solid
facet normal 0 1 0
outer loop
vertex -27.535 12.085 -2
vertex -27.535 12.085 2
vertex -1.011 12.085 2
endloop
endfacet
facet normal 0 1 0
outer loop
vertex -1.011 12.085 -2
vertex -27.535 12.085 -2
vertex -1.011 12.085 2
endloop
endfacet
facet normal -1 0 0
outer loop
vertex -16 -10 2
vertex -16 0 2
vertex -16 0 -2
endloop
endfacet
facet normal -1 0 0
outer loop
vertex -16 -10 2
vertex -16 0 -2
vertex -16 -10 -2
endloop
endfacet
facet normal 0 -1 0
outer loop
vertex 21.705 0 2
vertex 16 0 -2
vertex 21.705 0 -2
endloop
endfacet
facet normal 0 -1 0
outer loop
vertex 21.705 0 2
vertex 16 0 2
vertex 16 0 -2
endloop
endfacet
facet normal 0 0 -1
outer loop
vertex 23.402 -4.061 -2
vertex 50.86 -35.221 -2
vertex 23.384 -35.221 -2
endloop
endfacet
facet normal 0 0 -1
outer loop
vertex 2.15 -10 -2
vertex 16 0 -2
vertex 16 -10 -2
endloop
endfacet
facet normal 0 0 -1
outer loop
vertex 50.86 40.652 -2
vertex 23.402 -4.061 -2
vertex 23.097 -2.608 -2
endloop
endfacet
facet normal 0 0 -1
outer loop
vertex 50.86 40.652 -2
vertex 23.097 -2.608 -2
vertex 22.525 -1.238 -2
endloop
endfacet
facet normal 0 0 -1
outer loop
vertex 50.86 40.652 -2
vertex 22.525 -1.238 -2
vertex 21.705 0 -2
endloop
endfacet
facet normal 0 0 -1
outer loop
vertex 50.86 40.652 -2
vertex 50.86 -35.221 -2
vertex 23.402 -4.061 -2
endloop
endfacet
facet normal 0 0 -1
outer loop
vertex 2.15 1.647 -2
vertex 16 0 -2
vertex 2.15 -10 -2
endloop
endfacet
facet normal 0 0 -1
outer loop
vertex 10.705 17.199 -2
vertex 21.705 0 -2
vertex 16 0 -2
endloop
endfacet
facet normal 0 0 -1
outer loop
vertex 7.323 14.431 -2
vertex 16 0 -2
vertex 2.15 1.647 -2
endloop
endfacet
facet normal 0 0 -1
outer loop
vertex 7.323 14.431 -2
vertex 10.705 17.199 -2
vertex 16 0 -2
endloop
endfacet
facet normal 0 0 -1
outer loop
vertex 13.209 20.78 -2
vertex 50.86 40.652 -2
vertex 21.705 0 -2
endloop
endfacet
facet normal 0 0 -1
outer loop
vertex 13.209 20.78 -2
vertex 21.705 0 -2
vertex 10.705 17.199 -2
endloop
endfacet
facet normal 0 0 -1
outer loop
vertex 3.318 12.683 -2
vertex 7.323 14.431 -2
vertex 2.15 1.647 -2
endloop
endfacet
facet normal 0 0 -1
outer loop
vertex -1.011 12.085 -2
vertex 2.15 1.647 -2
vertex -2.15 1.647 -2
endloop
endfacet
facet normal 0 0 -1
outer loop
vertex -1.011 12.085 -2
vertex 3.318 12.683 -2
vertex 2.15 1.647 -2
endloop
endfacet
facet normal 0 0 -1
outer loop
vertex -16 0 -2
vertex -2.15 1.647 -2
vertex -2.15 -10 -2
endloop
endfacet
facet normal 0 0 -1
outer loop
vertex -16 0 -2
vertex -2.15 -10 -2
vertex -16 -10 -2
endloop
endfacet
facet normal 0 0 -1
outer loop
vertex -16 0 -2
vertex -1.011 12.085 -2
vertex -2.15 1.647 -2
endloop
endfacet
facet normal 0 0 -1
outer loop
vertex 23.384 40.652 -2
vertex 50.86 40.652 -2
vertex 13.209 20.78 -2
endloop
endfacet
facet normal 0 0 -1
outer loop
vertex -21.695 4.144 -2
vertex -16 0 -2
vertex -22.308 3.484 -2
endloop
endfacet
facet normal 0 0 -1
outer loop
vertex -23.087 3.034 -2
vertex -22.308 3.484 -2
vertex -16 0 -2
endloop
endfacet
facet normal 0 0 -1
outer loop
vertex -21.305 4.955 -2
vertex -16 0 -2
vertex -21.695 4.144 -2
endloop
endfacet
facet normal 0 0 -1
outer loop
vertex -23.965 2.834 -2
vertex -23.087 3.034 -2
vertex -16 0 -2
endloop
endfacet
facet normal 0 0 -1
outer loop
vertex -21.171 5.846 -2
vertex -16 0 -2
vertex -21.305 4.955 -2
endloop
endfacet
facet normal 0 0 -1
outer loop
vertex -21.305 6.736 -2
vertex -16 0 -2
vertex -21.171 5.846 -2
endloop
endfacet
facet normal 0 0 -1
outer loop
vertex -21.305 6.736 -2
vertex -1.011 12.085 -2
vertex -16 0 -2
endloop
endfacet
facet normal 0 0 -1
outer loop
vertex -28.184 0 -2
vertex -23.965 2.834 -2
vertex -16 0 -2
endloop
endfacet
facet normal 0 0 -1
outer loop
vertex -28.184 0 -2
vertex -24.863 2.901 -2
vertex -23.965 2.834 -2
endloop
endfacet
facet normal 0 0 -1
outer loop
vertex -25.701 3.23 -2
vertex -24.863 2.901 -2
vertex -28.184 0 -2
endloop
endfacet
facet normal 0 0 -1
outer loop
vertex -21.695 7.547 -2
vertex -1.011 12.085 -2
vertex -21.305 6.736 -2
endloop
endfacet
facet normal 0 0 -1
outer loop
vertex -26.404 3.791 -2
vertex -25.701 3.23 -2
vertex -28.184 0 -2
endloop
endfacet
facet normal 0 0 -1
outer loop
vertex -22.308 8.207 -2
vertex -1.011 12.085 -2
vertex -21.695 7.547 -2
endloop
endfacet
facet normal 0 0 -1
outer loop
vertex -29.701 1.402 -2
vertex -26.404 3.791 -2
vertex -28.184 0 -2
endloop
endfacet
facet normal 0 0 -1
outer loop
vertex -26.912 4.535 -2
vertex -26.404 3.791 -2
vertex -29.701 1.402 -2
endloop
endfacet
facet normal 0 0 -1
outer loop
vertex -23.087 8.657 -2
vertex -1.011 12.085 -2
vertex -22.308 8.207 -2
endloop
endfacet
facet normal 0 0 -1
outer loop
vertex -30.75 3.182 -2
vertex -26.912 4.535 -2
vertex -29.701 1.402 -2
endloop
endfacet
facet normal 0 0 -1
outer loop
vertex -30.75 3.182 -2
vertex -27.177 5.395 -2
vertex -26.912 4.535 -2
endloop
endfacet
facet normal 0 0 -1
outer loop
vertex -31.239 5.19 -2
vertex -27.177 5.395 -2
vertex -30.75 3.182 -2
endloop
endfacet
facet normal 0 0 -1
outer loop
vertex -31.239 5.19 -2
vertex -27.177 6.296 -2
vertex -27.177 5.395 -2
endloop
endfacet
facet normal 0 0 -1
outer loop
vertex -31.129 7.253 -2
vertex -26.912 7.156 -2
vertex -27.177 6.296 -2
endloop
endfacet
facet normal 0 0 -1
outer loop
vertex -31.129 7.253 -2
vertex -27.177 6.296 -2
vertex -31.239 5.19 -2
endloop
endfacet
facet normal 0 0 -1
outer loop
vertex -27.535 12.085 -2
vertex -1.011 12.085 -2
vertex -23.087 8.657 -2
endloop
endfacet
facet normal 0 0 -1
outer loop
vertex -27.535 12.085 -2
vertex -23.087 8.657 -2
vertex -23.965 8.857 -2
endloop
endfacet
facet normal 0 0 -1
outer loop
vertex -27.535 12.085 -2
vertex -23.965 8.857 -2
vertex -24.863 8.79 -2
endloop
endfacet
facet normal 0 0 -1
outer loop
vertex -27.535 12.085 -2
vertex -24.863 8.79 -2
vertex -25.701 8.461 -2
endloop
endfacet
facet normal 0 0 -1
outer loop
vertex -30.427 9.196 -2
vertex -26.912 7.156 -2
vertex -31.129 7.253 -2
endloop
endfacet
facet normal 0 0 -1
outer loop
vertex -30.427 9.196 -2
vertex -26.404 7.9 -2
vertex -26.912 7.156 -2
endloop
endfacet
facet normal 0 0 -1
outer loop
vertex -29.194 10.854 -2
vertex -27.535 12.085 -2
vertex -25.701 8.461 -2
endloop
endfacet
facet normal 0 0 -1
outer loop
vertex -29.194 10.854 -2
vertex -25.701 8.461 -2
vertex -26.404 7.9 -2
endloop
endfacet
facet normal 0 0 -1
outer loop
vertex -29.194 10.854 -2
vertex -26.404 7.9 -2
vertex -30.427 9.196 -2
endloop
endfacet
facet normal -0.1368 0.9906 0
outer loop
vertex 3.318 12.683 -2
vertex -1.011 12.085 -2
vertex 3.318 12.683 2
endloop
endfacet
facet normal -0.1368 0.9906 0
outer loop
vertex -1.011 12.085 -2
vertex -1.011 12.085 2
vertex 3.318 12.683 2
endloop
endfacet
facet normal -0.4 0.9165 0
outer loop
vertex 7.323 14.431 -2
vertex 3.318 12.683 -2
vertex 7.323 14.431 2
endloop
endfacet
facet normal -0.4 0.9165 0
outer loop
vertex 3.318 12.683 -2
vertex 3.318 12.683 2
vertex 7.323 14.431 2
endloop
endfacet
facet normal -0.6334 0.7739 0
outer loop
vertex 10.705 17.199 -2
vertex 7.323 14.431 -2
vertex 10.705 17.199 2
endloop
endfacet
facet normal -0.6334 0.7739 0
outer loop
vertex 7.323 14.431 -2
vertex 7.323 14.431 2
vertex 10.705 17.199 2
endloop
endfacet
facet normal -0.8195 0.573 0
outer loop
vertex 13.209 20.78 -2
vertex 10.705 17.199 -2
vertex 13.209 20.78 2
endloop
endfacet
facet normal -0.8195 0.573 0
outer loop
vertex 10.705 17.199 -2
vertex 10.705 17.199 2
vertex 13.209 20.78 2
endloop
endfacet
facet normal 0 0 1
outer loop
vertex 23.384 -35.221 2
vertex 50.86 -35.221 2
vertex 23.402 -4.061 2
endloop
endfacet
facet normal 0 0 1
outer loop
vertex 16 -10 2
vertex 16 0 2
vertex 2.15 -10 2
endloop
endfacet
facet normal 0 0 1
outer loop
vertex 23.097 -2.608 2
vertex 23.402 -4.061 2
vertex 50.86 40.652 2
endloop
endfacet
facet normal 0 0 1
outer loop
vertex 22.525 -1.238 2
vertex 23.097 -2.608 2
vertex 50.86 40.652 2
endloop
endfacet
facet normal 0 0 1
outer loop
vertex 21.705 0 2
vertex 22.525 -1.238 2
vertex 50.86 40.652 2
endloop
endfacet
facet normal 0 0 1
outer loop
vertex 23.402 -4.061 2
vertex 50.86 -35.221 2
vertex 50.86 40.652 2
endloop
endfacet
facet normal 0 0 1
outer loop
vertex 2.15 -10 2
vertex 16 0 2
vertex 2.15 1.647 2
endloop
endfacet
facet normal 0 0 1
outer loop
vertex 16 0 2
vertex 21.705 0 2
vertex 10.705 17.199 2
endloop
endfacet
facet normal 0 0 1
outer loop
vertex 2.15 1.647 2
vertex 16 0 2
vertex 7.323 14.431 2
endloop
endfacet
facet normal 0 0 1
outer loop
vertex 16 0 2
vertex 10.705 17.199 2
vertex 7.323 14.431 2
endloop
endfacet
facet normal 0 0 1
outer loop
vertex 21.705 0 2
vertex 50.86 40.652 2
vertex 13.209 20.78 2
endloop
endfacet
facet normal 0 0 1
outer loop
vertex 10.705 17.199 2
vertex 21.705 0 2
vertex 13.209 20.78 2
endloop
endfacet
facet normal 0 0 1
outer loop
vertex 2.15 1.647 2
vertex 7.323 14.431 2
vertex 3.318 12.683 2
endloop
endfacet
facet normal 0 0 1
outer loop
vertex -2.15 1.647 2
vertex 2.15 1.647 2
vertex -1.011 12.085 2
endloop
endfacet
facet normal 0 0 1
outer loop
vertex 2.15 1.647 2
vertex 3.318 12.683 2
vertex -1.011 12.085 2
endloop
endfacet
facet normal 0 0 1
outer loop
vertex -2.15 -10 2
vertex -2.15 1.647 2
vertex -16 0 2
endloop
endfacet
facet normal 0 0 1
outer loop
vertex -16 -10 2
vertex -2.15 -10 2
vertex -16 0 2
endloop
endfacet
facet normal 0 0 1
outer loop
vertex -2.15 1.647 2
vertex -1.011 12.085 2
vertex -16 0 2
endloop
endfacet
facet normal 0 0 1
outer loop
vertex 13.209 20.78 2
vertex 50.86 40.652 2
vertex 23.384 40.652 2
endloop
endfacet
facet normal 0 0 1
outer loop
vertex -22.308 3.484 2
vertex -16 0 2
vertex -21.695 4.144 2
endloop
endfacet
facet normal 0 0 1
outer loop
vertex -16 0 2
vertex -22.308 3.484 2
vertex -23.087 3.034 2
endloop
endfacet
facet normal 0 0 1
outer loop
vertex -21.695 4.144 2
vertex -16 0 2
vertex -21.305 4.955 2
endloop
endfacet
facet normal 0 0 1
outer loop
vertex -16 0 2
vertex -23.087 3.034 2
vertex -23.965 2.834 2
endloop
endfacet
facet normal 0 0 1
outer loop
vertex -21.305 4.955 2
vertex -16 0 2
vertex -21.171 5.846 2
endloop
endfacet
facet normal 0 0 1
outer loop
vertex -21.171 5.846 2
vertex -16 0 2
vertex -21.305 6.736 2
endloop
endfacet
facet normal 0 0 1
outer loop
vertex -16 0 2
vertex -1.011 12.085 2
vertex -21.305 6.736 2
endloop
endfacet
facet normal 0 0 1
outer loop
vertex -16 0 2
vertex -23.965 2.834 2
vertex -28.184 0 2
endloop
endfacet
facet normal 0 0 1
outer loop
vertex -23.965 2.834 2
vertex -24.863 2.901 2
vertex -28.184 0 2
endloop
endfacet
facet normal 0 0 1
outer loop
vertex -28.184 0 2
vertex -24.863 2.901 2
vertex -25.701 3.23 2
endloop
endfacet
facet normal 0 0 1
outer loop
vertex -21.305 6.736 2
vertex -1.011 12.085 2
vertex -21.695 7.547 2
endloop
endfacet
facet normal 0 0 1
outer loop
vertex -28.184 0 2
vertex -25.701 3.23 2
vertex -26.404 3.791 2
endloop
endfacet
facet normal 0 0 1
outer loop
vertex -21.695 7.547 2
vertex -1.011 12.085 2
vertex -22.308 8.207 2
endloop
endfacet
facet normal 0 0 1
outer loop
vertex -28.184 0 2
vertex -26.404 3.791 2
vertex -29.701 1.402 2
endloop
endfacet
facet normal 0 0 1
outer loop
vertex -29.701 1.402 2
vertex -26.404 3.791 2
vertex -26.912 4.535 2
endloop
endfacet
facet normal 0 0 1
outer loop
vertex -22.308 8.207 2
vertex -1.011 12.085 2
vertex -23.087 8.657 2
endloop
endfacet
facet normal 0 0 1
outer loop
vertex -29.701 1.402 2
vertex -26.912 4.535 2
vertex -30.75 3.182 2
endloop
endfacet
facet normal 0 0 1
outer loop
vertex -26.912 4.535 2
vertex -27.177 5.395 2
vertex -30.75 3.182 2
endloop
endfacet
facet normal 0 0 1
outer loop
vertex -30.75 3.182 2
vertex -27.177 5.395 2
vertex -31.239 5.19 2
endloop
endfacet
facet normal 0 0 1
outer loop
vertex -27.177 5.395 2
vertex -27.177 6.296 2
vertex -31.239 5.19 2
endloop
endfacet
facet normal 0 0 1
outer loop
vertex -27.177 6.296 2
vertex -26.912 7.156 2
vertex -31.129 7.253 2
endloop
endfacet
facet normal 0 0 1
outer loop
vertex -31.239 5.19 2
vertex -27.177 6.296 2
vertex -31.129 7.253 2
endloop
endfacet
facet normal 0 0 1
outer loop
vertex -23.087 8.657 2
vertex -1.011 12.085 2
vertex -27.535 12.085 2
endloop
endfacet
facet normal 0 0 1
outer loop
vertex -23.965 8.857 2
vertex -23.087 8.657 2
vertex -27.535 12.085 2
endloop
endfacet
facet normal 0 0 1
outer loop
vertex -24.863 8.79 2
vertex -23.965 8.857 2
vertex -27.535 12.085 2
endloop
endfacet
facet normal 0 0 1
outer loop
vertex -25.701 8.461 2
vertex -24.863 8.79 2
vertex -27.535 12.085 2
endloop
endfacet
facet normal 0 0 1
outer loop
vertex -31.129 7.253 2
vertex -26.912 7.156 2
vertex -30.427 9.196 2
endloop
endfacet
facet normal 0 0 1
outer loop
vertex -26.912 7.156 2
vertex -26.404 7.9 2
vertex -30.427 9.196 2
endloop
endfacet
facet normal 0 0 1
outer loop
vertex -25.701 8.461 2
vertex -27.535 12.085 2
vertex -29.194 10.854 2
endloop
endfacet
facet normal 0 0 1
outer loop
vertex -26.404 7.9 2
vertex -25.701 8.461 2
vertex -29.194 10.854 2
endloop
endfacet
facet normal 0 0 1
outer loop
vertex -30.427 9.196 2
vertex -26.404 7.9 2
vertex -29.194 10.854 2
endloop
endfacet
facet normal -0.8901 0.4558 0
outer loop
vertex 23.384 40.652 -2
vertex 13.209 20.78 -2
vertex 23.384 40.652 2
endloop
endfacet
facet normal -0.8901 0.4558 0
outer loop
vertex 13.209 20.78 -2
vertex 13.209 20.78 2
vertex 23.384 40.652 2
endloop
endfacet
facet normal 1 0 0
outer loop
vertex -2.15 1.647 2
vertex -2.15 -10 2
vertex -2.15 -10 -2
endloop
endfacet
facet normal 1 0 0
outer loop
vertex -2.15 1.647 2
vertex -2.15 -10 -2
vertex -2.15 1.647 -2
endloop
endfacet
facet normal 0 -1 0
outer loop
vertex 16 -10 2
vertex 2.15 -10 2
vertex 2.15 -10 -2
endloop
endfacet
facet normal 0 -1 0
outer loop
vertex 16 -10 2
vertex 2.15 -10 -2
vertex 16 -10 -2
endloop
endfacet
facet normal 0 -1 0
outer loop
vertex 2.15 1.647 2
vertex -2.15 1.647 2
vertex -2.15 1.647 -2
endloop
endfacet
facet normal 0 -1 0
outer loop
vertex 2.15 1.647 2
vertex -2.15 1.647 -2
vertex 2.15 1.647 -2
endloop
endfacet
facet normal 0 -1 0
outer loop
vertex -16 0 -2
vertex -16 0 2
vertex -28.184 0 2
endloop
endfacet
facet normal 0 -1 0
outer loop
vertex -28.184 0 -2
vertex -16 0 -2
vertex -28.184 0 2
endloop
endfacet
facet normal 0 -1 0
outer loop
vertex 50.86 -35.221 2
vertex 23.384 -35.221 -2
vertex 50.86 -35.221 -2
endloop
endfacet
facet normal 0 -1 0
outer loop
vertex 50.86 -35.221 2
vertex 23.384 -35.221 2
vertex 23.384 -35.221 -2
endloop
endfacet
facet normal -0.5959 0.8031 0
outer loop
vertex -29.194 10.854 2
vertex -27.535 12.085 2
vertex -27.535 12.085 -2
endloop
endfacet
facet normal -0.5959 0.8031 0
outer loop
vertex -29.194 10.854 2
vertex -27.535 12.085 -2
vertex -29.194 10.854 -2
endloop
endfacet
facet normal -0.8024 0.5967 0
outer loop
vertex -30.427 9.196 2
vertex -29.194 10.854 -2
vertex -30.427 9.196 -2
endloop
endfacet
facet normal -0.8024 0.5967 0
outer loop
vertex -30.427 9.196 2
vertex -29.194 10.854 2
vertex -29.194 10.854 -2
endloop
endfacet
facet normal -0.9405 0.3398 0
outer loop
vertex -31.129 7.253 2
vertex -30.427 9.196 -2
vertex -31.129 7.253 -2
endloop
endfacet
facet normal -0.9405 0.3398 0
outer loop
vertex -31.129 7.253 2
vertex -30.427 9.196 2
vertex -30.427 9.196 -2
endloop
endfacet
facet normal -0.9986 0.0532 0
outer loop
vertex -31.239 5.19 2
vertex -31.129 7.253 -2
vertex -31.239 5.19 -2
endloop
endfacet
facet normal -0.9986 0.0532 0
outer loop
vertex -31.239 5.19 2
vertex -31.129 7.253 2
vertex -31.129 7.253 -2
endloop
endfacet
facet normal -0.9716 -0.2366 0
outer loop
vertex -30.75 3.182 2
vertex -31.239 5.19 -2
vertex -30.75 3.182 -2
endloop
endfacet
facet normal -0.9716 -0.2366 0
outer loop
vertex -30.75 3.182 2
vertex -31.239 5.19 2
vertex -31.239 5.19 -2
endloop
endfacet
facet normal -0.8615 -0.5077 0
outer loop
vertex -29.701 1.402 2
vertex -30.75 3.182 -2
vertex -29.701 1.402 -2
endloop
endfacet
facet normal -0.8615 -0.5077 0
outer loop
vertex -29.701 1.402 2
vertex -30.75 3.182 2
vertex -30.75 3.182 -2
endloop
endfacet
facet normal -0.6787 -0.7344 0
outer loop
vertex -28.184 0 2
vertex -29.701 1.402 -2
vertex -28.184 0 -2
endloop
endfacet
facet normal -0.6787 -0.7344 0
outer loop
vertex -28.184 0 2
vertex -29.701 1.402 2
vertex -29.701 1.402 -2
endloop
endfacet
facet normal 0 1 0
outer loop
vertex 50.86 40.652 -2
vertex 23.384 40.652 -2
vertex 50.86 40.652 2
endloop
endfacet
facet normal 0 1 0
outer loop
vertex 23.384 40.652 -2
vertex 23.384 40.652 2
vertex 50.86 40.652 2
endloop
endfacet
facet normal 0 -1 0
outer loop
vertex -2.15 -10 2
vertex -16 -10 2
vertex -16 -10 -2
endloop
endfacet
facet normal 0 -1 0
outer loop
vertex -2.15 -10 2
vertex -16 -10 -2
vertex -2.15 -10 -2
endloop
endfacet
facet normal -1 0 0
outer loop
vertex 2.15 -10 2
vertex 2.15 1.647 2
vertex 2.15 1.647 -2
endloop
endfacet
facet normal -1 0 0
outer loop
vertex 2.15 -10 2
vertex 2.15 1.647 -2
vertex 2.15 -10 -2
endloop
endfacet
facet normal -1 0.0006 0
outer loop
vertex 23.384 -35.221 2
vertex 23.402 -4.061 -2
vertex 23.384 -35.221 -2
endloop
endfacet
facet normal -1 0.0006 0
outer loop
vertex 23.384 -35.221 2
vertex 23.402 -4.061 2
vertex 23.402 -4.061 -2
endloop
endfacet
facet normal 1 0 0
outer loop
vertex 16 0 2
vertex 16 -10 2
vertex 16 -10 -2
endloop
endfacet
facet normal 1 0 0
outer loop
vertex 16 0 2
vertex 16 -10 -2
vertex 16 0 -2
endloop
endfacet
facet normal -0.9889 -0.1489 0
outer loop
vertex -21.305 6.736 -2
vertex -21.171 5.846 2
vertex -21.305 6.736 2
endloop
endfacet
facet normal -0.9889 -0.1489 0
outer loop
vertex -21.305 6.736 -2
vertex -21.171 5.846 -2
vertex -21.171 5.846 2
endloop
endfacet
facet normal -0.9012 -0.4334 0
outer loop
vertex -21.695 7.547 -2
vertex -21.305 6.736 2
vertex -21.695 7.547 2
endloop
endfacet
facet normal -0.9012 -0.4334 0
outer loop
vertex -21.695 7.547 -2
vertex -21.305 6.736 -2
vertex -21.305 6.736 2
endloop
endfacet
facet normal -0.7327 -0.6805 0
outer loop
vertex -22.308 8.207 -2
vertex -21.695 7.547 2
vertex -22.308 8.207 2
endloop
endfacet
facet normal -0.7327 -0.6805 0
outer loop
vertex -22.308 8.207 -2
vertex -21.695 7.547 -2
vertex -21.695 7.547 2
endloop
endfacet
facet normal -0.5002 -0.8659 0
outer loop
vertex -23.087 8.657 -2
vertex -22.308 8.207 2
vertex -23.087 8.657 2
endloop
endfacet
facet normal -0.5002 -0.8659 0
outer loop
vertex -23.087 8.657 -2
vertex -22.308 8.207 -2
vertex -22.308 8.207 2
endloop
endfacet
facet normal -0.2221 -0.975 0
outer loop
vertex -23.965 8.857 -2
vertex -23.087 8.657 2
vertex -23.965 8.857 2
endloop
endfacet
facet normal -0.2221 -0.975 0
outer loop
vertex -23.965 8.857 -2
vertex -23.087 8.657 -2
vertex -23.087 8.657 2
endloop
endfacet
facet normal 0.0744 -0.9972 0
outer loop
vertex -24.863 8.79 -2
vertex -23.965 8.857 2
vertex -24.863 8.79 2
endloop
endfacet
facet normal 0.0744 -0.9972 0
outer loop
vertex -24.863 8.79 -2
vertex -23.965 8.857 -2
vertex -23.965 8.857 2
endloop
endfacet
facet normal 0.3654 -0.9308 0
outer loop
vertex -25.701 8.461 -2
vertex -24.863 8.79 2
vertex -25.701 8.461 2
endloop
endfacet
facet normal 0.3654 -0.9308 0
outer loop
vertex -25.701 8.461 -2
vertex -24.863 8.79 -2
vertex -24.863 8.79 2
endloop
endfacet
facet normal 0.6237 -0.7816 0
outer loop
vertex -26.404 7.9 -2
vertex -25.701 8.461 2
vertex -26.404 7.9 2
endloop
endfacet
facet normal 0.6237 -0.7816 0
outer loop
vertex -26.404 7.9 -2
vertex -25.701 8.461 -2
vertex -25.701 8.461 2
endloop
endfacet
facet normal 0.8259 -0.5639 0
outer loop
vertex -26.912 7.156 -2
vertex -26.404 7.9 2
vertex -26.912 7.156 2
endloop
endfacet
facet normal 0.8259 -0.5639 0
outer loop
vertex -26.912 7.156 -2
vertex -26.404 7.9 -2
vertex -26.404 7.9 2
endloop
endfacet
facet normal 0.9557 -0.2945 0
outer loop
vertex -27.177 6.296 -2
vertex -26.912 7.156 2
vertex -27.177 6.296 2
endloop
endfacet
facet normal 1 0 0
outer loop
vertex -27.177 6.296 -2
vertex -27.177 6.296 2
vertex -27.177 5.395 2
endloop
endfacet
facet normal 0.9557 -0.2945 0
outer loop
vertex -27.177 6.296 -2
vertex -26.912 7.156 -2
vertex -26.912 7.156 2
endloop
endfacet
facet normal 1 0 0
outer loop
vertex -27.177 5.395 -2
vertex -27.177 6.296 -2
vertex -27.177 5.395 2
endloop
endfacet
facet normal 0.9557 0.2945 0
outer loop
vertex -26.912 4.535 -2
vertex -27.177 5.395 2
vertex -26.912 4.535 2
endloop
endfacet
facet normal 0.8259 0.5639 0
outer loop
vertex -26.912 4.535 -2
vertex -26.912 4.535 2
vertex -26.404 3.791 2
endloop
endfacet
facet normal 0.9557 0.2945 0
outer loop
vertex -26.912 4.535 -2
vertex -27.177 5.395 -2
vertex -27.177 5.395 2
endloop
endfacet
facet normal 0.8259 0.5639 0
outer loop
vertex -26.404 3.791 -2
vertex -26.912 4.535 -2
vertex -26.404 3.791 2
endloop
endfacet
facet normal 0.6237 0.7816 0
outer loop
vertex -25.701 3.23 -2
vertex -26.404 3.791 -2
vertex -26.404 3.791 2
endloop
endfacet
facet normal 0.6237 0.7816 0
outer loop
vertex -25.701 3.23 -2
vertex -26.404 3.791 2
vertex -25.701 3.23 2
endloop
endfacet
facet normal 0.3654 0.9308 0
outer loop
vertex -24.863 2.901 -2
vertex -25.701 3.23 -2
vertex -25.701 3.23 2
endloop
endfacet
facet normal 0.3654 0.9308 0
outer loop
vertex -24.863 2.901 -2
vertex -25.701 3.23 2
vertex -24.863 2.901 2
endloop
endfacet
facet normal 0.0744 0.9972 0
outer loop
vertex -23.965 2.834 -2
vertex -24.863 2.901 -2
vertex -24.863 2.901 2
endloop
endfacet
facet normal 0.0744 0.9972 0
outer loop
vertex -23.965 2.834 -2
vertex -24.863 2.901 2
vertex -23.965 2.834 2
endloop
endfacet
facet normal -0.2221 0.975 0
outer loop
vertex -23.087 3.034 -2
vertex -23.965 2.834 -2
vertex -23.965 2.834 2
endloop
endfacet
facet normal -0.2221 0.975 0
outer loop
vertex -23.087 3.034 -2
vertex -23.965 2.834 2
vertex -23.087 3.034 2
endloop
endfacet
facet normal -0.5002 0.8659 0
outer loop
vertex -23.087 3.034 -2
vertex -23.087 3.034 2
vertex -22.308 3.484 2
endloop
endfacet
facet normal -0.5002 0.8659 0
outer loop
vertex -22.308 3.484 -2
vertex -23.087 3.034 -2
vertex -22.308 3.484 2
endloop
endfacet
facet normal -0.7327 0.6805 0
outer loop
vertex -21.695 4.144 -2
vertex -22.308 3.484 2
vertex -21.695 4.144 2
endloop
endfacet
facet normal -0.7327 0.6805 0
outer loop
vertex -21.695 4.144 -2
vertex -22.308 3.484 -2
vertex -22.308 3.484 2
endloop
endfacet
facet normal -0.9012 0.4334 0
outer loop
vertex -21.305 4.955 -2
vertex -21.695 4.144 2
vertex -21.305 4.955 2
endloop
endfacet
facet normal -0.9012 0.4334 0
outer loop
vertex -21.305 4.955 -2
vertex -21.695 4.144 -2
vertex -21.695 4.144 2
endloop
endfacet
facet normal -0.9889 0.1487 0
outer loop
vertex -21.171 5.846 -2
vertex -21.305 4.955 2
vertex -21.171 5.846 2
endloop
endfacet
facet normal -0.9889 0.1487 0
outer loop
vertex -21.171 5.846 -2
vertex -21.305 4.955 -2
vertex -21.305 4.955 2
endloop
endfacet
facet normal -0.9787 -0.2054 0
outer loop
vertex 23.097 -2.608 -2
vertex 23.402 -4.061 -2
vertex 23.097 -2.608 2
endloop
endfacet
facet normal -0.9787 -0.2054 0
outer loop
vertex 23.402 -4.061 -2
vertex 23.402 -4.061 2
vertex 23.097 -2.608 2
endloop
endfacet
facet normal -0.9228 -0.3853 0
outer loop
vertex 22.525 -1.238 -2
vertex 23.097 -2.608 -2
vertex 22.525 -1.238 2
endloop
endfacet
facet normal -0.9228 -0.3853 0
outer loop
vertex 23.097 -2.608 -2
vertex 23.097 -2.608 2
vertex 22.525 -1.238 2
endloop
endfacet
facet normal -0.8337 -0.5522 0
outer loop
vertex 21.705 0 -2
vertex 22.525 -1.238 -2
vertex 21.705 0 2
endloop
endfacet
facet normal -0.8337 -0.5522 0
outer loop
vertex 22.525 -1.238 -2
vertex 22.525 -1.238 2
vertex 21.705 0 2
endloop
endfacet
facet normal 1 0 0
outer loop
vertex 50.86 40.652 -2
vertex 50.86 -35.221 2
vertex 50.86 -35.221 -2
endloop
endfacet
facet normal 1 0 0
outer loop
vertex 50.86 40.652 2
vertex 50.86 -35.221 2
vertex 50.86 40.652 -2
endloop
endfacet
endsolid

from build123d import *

# Parameters (mm, degrees)
COPYSKETCH004_R = 3.02
PAD_DEPTH       = 2


with BuildPart() as part:
    # CopySketch004 → Pad (new body, symmetric)
    with BuildSketch(Plane.XY):
        with BuildLine():
            Line((-27.534542, 12.08528), (-1.01073, 12.08528))
            ThreePointArc((-1.01073, 12.08528), (7.323138, 14.431249), (13.209413, 20.780161))
            Line((13.209413, 20.780161), (23.383837, 40.65183))
            Line((23.383837, 40.65183), (50.86044, 40.65183))
            Line((50.86044, 40.65183), (50.86044, 0))
            Line((50.86044, -35.221027), (50.86044, 0))
            Line((23.383837, -35.221027), (50.86044, -35.221027))
            Line((23.401691, -4.060687), (23.383837, -35.221027))
            ThreePointArc((23.401691, -4.060687), (22.843077, -1.909417), (21.705474, 0))
            Line((16, 0), (21.705474, 0))
            Line((16, -10), (16, 0))
            Line((2.15, -10), (16, -10))
            Line((2.15, 1.647389), (2.15, -10))
            Line((-2.15, 1.647389), (2.15, 1.647389))
            Line((-2.15, -10), (-2.15, 1.647389))
            Line((-16, -10), (-2.15, -10))
            Line((-16, 0), (-16, -10))
            Line((-16, 0), (-28.183644, 0))
            ThreePointArc((-27.534542, 12.08528), (-31.259646, 6.225284), (-28.183644, 0))
        make_face()
        with Locations((-24.190611, 5.845606)):
            Circle(COPYSKETCH004_R, mode=Mode.SUBTRACT)
    extrude(amount=PAD_DEPTH, both=True)


solid = part.part
